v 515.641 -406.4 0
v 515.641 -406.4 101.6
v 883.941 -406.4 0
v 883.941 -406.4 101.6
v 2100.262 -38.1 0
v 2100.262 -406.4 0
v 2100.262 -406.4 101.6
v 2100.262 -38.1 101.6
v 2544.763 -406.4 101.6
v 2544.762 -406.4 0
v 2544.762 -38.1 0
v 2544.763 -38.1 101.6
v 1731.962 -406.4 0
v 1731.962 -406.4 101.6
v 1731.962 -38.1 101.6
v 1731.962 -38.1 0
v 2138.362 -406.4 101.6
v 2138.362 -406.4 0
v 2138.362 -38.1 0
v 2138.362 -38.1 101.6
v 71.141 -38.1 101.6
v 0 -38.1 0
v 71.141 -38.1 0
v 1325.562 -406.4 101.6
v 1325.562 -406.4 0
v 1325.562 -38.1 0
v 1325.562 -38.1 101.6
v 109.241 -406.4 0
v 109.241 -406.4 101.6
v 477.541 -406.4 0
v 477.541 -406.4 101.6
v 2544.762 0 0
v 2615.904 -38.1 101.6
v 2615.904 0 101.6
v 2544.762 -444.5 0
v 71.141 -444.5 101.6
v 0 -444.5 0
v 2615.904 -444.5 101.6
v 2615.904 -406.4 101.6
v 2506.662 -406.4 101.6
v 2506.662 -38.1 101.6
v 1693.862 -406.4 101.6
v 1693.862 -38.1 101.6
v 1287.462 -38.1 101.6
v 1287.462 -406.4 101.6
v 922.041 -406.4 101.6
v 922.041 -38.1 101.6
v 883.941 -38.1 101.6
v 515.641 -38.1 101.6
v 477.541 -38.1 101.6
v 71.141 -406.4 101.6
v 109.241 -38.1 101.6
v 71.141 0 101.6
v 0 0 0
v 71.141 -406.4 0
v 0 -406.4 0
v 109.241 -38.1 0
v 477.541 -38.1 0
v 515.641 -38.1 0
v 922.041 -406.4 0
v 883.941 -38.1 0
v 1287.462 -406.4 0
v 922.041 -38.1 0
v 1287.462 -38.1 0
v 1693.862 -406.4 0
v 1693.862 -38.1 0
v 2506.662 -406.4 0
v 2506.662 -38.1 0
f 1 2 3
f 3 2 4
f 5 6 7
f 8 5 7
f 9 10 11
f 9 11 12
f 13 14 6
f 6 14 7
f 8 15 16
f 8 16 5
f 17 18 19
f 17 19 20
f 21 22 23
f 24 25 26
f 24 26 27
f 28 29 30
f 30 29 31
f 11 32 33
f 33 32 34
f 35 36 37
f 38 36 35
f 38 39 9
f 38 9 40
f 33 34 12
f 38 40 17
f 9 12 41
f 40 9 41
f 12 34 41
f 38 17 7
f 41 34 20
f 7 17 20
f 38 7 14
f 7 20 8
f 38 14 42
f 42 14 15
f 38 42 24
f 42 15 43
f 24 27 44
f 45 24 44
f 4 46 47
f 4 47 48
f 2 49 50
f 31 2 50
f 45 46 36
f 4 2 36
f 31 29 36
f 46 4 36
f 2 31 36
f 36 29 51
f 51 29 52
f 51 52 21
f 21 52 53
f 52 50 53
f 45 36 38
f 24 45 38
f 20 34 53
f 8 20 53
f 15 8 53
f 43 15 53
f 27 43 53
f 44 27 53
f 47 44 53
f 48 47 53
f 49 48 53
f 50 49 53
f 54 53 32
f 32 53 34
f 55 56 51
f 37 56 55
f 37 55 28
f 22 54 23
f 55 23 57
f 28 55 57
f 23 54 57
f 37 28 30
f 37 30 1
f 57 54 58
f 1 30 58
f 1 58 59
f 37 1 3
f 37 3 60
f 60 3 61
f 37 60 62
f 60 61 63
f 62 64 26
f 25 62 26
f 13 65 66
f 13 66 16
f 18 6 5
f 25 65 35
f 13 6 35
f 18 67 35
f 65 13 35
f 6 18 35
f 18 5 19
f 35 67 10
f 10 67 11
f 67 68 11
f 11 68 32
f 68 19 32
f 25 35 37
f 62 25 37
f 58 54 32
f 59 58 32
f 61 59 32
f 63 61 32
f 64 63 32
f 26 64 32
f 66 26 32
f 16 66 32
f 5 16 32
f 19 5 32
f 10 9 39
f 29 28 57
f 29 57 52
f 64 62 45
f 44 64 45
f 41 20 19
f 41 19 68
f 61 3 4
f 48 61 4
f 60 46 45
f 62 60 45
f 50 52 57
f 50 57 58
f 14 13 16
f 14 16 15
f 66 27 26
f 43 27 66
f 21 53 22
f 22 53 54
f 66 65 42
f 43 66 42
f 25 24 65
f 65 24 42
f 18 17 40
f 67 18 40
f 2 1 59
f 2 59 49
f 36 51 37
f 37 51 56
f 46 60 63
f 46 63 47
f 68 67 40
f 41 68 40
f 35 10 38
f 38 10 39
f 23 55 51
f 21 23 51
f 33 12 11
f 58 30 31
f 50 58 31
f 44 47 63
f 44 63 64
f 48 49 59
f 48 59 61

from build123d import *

# Parameters (mm, degrees)
F1_DEPTH = 38.1
F2_W     = 38.1
F2_H     = 101.6
F3_DEPTH = 368.3
F4_W     = 38.1
F4_H     = 101.6
F5_DEPTH = 38.1


# Not quite as in the source:
# - a feature names something its author has since deleted; it is built from what else it names


with BuildPart() as f1:
    # F0 (on Front) → F1 (new body)
    with BuildSketch(Plane.XZ):
        Polygon((71.1410858821, 101.6), (0, 0), (2544.7625, 0), (2615.9035858821, 101.6), align=None)
    extrude(amount=F1_DEPTH)

    # F2 (on face) → F3 (join)
    with BuildSketch(Plane.XZ.offset(38.1)):
        with Locations((90.1910858821, 50.8)):
            Rectangle(F2_W, F2_H)
        with Locations((496.5910858821, 50.8)):
            Rectangle(F2_W, F2_H)
        with Locations((902.9910858821, 50.8)):
            Rectangle(F2_W, F2_H)
        with Locations((1306.5125, 50.8)):
            Rectangle(F2_W, F2_H)
        with Locations((1712.9125, 50.8)):
            Rectangle(F2_W, F2_H)
        with Locations((2119.3125, 50.8)):
            Rectangle(F2_W, F2_H)
        with Locations((2525.7125, 50.8)):
            Rectangle(F2_W, F2_H)
    extrude(amount=F3_DEPTH)

    # F4 (on face) → F5 (join)
    with BuildSketch(Plane.XZ.offset(406.4)):
        Polygon((2615.9035858821, 101.6), (109.2410858821, 101.6), (109.2410858821, 0), (2544.7625, 0), align=None)
        with Locations((90.1910858821, 50.8)):
            Rectangle(F4_W, F4_H)
        Polygon((71.1410858821, 101.6), (0, 0), (71.1410858821, 0), align=None)
    extrude(amount=F5_DEPTH)


solid = f1.part
